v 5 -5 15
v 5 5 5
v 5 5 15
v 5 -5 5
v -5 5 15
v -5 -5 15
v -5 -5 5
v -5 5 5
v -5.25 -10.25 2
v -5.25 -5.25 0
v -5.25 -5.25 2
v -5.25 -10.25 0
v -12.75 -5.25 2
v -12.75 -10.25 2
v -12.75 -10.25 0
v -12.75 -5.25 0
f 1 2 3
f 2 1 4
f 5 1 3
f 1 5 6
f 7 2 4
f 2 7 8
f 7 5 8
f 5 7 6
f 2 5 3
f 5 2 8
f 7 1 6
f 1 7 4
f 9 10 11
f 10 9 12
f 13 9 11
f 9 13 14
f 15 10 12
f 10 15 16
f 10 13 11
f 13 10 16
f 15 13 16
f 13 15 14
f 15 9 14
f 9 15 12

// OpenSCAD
translate([0, 0, 10]) color([0,1,0,0.9]) cube([10, 10, 10], center=true);
translate([-5.5, -5.5, 1]) color([1,0,0]) cube([0.5, 0.5, 2], center=true);
translate([-6, -5.5, 1]) color([1,0,0]) cube([0.5, 0.5, 2], center=true);
translate([-6.5, -5.5, 1]) color([1,0,0]) cube([0.5, 0.5, 2], center=true);
translate([-7, -5.5, 1]) color([1,0,0]) cube([0.5, 0.5, 2], center=true);
translate([-7.5, -5.5, 1]) color([1,0,0]) cube([0.5, 0.5, 2], center=true);
translate([-8, -5.5, 1]) color([1,0,0]) cube([0.5, 0.5, 2], center=true);
translate([-8.5, -5.5, 1]) color([1,0,0]) cube([0.5, 0.5, 2], center=true);
translate([-9, -5.5, 1]) color([1,0,0]) cube([0.5, 0.5, 2], center=true);
translate([-9.5, -5.5, 1]) color([1,0,0]) cube([0.5, 0.5, 2], center=true);
translate([-10, -5.5, 1]) color([1,0,0]) cube([0.5, 0.5, 2], center=true);
translate([-10.5, -5.5, 1]) color([1,0,0]) cube([0.5, 0.5, 2], center=true);
translate([-11, -5.5, 1]) color([1,0,0]) cube([0.5, 0.5, 2], center=true);
translate([-11.5, -5.5, 1]) color([1,0,0]) cube([0.5, 0.5, 2], center=true);
translate([-12, -5.5, 1]) color([1,0,0]) cube([0.5, 0.5, 2], center=true);
translate([-12.5, -5.5, 1]) color([1,0,0]) cube([0.5, 0.5, 2], center=true);
translate([-5.5, -6, 1]) color([1,0,0]) cube([0.5, 0.5, 2], center=true);
translate([-6, -6, 1]) color([1,0,0]) cube([0.5, 0.5, 2], center=true);
translate([-6.5, -6, 1]) color([1,0,0]) cube([0.5, 0.5, 2], center=true);
translate([-7, -6, 1]) color([1,0,0]) cube([0.5, 0.5, 2], center=true);
translate([-7.5, -6, 1]) color([1,0,0]) cube([0.5, 0.5, 2], center=true);
translate([-8, -6, 1]) color([1,0,0]) cube([0.5, 0.5, 2], center=true);
translate([-8.5, -6, 1]) color([1,0,0]) cube([0.5, 0.5, 2], center=true);
translate([-9, -6, 1]) color([1,0,0]) cube([0.5, 0.5, 2], center=true);
translate([-9.5, -6, 1]) color([1,0,0]) cube([0.5, 0.5, 2], center=true);
translate([-10, -6, 1]) color([1,0,0]) cube([0.5, 0.5, 2], center=true);
translate([-10.5, -6, 1]) color([1,0,0]) cube([0.5, 0.5, 2], center=true);
translate([-11, -6, 1]) color([1,0,0]) cube([0.5, 0.5, 2], center=true);
translate([-11.5, -6, 1]) color([1,0,0]) cube([0.5, 0.5, 2], center=true);
translate([-12, -6, 1]) color([1,0,0]) cube([0.5, 0.5, 2], center=true);
translate([-12.5, -6, 1]) color([1,0,0]) cube([0.5, 0.5, 2], center=true);
translate([-5.5, -6.5, 1]) color([1,0,0]) cube([0.5, 0.5, 2], center=true);
translate([-6, -6.5, 1]) color([1,0,0]) cube([0.5, 0.5, 2], center=true);
translate([-6.5, -6.5, 1]) color([1,0,0]) cube([0.5, 0.5, 2], center=true);
translate([-7, -6.5, 1]) color([1,0,0]) cube([0.5, 0.5, 2], center=true);
translate([-7.5, -6.5, 1]) color([1,0,0]) cube([0.5, 0.5, 2], center=true);
translate([-8, -6.5, 1]) color([1,0,0]) cube([0.5, 0.5, 2], center=true);
translate([-8.5, -6.5, 1]) color([1,0,0]) cube([0.5, 0.5, 2], center=true);
translate([-9, -6.5, 1]) color([1,0,0]) cube([0.5, 0.5, 2], center=true);
translate([-9.5, -6.5, 1]) color([1,0,0]) cube([0.5, 0.5, 2], center=true);
translate([-10, -6.5, 1]) color([1,0,0]) cube([0.5, 0.5, 2], center=true);
translate([-10.5, -6.5, 1]) color([1,0,0]) cube([0.5, 0.5, 2], center=true);
translate([-11, -6.5, 1]) color([1,0,0]) cube([0.5, 0.5, 2], center=true);
translate([-11.5, -6.5, 1]) color([1,0,0]) cube([0.5, 0.5, 2], center=true);
translate([-12, -6.5, 1]) color([1,0,0]) cube([0.5, 0.5, 2], center=true);
translate([-12.5, -6.5, 1]) color([1,0,0]) cube([0.5, 0.5, 2], center=true);
translate([-5.5, -7, 1]) color([1,0,0]) cube([0.5, 0.5, 2], center=true);
translate([-6, -7, 1]) color([1,0,0]) cube([0.5, 0.5, 2], center=true);
translate([-6.5, -7, 1]) color([1,0,0]) cube([0.5, 0.5, 2], center=true);
translate([-7, -7, 1]) color([1,0,0]) cube([0.5, 0.5, 2], center=true);
translate([-7.5, -7, 1]) color([1,0,0]) cube([0.5, 0.5, 2], center=true);
translate([-8, -7, 1]) color([1,0,0]) cube([0.5, 0.5, 2], center=true);
translate([-8.5, -7, 1]) color([1,0,0]) cube([0.5, 0.5, 2], center=true);
translate([-9, -7, 1]) color([1,0,0]) cube([0.5, 0.5, 2], center=true);
translate([-9.5, -7, 1]) color([1,0,0]) cube([0.5, 0.5, 2], center=true);
translate([-10, -7, 1]) color([1,0,0]) cube([0.5, 0.5, 2], center=true);
translate([-10.5, -7, 1]) color([1,0,0]) cube([0.5, 0.5, 2], center=true);
translate([-11, -7, 1]) color([1,0,0]) cube([0.5, 0.5, 2], center=true);
translate([-11.5, -7, 1]) color([1,0,0]) cube([0.5, 0.5, 2], center=true);
translate([-12, -7, 1]) color([1,0,0]) cube([0.5, 0.5, 2], center=true);
translate([-12.5, -7, 1]) color([1,0,0]) cube([0.5, 0.5, 2], center=true);
translate([-5.5, -7.5, 1]) color([1,0,0]) cube([0.5, 0.5, 2], center=true);
translate([-6, -7.5, 1]) color([1,0,0]) cube([0.5, 0.5, 2], center=true);
translate([-6.5, -7.5, 1]) color([1,0,0]) cube([0.5, 0.5, 2], center=true);
translate([-7, -7.5, 1]) color([1,0,0]) cube([0.5, 0.5, 2], center=true);
translate([-7.5, -7.5, 1]) color([1,0,0]) cube([0.5, 0.5, 2], center=true);
translate([-8, -7.5, 1]) color([1,0,0]) cube([0.5, 0.5, 2], center=true);
translate([-8.5, -7.5, 1]) color([1,0,0]) cube([0.5, 0.5, 2], center=true);
translate([-9, -7.5, 1]) color([1,0,0]) cube([0.5, 0.5, 2], center=true);
translate([-9.5, -7.5, 1]) color([1,0,0]) cube([0.5, 0.5, 2], center=true);
translate([-10, -7.5, 1]) color([1,0,0]) cube([0.5, 0.5, 2], center=true);
translate([-10.5, -7.5, 1]) color([1,0,0]) cube([0.5, 0.5, 2], center=true);
translate([-11, -7.5, 1]) color([1,0,0]) cube([0.5, 0.5, 2], center=true);
translate([-11.5, -7.5, 1]) color([1,0,0]) cube([0.5, 0.5, 2], center=true);
translate([-12, -7.5, 1]) color([1,0,0]) cube([0.5, 0.5, 2], center=true);
translate([-12.5, -7.5, 1]) color([1,0,0]) cube([0.5, 0.5, 2], center=true);
translate([-5.5, -8, 1]) color([1,0,0]) cube([0.5, 0.5, 2], center=true);
translate([-6, -8, 1]) color([1,0,0]) cube([0.5, 0.5, 2], center=true);
translate([-6.5, -8, 1]) color([1,0,0]) cube([0.5, 0.5, 2], center=true);
translate([-7, -8, 1]) color([1,0,0]) cube([0.5, 0.5, 2], center=true);
translate([-7.5, -8, 1]) color([1,0,0]) cube([0.5, 0.5, 2], center=true);
translate([-8, -8, 1]) color([1,0,0]) cube([0.5, 0.5, 2], center=true);
translate([-8.5, -8, 1]) color([1,0,0]) cube([0.5, 0.5, 2], center=true);
translate([-9, -8, 1]) color([1,0,0]) cube([0.5, 0.5, 2], center=true);
translate([-9.5, -8, 1]) color([1,0,0]) cube([0.5, 0.5, 2], center=true);
translate([-10, -8, 1]) color([1,0,0]) cube([0.5, 0.5, 2], center=true);
translate([-10.5, -8, 1]) color([1,0,0]) cube([0.5, 0.5, 2], center=true);
translate([-11, -8, 1]) color([1,0,0]) cube([0.5, 0.5, 2], center=true);
translate([-11.5, -8, 1]) color([1,0,0]) cube([0.5, 0.5, 2], center=true);
translate([-12, -8, 1]) color([1,0,0]) cube([0.5, 0.5, 2], center=true);
translate([-12.5, -8, 1]) color([1,0,0]) cube([0.5, 0.5, 2], center=true);
translate([-5.5, -8.5, 1]) color([1,0,0]) cube([0.5, 0.5, 2], center=true);
translate([-6, -8.5, 1]) color([1,0,0]) cube([0.5, 0.5, 2], center=true);
translate([-6.5, -8.5, 1]) color([1,0,0]) cube([0.5, 0.5, 2], center=true);
translate([-7, -8.5, 1]) color([1,0,0]) cube([0.5, 0.5, 2], center=true);
translate([-7.5, -8.5, 1]) color([1,0,0]) cube([0.5, 0.5, 2], center=true);
translate([-8, -8.5, 1]) color([1,0,0]) cube([0.5, 0.5, 2], center=true);
translate([-8.5, -8.5, 1]) color([1,0,0]) cube([0.5, 0.5, 2], center=true);
translate([-9, -8.5, 1]) color([1,0,0]) cube([0.5, 0.5, 2], center=true);
translate([-9.5, -8.5, 1]) color([1,0,0]) cube([0.5, 0.5, 2], center=true);
translate([-10, -8.5, 1]) color([1,0,0]) cube([0.5, 0.5, 2], center=true);
translate([-10.5, -8.5, 1]) color([1,0,0]) cube([0.5, 0.5, 2], center=true);
translate([-11, -8.5, 1]) color([1,0,0]) cube([0.5, 0.5, 2], center=true);
translate([-11.5, -8.5, 1]) color([1,0,0]) cube([0.5, 0.5, 2], center=true);
translate([-12, -8.5, 1]) color([1,0,0]) cube([0.5, 0.5, 2], center=true);
translate([-12.5, -8.5, 1]) color([1,0,0]) cube([0.5, 0.5, 2], center=true);
translate([-5.5, -9, 1]) color([1,0,0]) cube([0.5, 0.5, 2], center=true);
translate([-6, -9, 1]) color([1,0,0]) cube([0.5, 0.5, 2], center=true);
translate([-6.5, -9, 1]) color([1,0,0]) cube([0.5, 0.5, 2], center=true);
translate([-7, -9, 1]) color([1,0,0]) cube([0.5, 0.5, 2], center=true);
translate([-7.5, -9, 1]) color([1,0,0]) cube([0.5, 0.5, 2], center=true);
translate([-8, -9, 1]) color([1,0,0]) cube([0.5, 0.5, 2], center=true);
translate([-8.5, -9, 1]) color([1,0,0]) cube([0.5, 0.5, 2], center=true);
translate([-9, -9, 1]) color([1,0,0]) cube([0.5, 0.5, 2], center=true);
translate([-9.5, -9, 1]) color([1,0,0]) cube([0.5, 0.5, 2], center=true);
translate([-10, -9, 1]) color([1,0,0]) cube([0.5, 0.5, 2], center=true);
translate([-10.5, -9, 1]) color([1,0,0]) cube([0.5, 0.5, 2], center=true);
translate([-11, -9, 1]) color([1,0,0]) cube([0.5, 0.5, 2], center=true);
translate([-11.5, -9, 1]) color([1,0,0]) cube([0.5, 0.5, 2], center=true);
translate([-12, -9, 1]) color([1,0,0]) cube([0.5, 0.5, 2], center=true);
translate([-12.5, -9, 1]) color([1,0,0]) cube([0.5, 0.5, 2], center=true);
translate([-5.5, -9.5, 1]) color([1,0,0]) cube([0.5, 0.5, 2], center=true);
translate([-6, -9.5, 1]) color([1,0,0]) cube([0.5, 0.5, 2], center=true);
translate([-6.5, -9.5, 1]) color([1,0,0]) cube([0.5, 0.5, 2], center=true);
translate([-7, -9.5, 1]) color([1,0,0]) cube([0.5, 0.5, 2], center=true);
translate([-7.5, -9.5, 1]) color([1,0,0]) cube([0.5, 0.5, 2], center=true);
translate([-8, -9.5, 1]) color([1,0,0]) cube([0.5, 0.5, 2], center=true);
translate([-8.5, -9.5, 1]) color([1,0,0]) cube([0.5, 0.5, 2], center=true);
translate([-9, -9.5, 1]) color([1,0,0]) cube([0.5, 0.5, 2], center=true);
translate([-9.5, -9.5, 1]) color([1,0,0]) cube([0.5, 0.5, 2], center=true);
translate([-10, -9.5, 1]) color([1,0,0]) cube([0.5, 0.5, 2], center=true);
translate([-10.5, -9.5, 1]) color([1,0,0]) cube([0.5, 0.5, 2], center=true);
translate([-11, -9.5, 1]) color([1,0,0]) cube([0.5, 0.5, 2], center=true);
translate([-11.5, -9.5, 1]) color([1,0,0]) cube([0.5, 0.5, 2], center=true);
translate([-12, -9.5, 1]) color([1,0,0]) cube([0.5, 0.5, 2], center=true);
translate([-12.5, -9.5, 1]) color([1,0,0]) cube([0.5, 0.5, 2], center=true);
translate([-5.5, -10, 1]) color([1,0,0]) cube([0.5, 0.5, 2], center=true);
translate([-6, -10, 1]) color([1,0,0]) cube([0.5, 0.5, 2], center=true);
translate([-6.5, -10, 1]) color([1,0,0]) cube([0.5, 0.5, 2], center=true);
translate([-7, -10, 1]) color([1,0,0]) cube([0.5, 0.5, 2], center=true);
translate([-7.5, -10, 1]) color([1,0,0]) cube([0.5, 0.5, 2], center=true);
translate([-8, -10, 1]) color([1,0,0]) cube([0.5, 0.5, 2], center=true);
translate([-8.5, -10, 1]) color([1,0,0]) cube([0.5, 0.5, 2], center=true);
translate([-9, -10, 1]) color([1,0,0]) cube([0.5, 0.5, 2], center=true);
translate([-9.5, -10, 1]) color([1,0,0]) cube([0.5, 0.5, 2], center=true);
translate([-10, -10, 1]) color([1,0,0]) cube([0.5, 0.5, 2], center=true);
translate([-10.5, -10, 1]) color([1,0,0]) cube([0.5, 0.5, 2], center=true);
translate([-11, -10, 1]) color([1,0,0]) cube([0.5, 0.5, 2], center=true);
translate([-11.5, -10, 1]) color([1,0,0]) cube([0.5, 0.5, 2], center=true);
translate([-12, -10, 1]) color([1,0,0]) cube([0.5, 0.5, 2], center=true);
translate([-12.5, -10, 1]) color([1,0,0]) cube([0.5, 0.5, 2], center=true);
